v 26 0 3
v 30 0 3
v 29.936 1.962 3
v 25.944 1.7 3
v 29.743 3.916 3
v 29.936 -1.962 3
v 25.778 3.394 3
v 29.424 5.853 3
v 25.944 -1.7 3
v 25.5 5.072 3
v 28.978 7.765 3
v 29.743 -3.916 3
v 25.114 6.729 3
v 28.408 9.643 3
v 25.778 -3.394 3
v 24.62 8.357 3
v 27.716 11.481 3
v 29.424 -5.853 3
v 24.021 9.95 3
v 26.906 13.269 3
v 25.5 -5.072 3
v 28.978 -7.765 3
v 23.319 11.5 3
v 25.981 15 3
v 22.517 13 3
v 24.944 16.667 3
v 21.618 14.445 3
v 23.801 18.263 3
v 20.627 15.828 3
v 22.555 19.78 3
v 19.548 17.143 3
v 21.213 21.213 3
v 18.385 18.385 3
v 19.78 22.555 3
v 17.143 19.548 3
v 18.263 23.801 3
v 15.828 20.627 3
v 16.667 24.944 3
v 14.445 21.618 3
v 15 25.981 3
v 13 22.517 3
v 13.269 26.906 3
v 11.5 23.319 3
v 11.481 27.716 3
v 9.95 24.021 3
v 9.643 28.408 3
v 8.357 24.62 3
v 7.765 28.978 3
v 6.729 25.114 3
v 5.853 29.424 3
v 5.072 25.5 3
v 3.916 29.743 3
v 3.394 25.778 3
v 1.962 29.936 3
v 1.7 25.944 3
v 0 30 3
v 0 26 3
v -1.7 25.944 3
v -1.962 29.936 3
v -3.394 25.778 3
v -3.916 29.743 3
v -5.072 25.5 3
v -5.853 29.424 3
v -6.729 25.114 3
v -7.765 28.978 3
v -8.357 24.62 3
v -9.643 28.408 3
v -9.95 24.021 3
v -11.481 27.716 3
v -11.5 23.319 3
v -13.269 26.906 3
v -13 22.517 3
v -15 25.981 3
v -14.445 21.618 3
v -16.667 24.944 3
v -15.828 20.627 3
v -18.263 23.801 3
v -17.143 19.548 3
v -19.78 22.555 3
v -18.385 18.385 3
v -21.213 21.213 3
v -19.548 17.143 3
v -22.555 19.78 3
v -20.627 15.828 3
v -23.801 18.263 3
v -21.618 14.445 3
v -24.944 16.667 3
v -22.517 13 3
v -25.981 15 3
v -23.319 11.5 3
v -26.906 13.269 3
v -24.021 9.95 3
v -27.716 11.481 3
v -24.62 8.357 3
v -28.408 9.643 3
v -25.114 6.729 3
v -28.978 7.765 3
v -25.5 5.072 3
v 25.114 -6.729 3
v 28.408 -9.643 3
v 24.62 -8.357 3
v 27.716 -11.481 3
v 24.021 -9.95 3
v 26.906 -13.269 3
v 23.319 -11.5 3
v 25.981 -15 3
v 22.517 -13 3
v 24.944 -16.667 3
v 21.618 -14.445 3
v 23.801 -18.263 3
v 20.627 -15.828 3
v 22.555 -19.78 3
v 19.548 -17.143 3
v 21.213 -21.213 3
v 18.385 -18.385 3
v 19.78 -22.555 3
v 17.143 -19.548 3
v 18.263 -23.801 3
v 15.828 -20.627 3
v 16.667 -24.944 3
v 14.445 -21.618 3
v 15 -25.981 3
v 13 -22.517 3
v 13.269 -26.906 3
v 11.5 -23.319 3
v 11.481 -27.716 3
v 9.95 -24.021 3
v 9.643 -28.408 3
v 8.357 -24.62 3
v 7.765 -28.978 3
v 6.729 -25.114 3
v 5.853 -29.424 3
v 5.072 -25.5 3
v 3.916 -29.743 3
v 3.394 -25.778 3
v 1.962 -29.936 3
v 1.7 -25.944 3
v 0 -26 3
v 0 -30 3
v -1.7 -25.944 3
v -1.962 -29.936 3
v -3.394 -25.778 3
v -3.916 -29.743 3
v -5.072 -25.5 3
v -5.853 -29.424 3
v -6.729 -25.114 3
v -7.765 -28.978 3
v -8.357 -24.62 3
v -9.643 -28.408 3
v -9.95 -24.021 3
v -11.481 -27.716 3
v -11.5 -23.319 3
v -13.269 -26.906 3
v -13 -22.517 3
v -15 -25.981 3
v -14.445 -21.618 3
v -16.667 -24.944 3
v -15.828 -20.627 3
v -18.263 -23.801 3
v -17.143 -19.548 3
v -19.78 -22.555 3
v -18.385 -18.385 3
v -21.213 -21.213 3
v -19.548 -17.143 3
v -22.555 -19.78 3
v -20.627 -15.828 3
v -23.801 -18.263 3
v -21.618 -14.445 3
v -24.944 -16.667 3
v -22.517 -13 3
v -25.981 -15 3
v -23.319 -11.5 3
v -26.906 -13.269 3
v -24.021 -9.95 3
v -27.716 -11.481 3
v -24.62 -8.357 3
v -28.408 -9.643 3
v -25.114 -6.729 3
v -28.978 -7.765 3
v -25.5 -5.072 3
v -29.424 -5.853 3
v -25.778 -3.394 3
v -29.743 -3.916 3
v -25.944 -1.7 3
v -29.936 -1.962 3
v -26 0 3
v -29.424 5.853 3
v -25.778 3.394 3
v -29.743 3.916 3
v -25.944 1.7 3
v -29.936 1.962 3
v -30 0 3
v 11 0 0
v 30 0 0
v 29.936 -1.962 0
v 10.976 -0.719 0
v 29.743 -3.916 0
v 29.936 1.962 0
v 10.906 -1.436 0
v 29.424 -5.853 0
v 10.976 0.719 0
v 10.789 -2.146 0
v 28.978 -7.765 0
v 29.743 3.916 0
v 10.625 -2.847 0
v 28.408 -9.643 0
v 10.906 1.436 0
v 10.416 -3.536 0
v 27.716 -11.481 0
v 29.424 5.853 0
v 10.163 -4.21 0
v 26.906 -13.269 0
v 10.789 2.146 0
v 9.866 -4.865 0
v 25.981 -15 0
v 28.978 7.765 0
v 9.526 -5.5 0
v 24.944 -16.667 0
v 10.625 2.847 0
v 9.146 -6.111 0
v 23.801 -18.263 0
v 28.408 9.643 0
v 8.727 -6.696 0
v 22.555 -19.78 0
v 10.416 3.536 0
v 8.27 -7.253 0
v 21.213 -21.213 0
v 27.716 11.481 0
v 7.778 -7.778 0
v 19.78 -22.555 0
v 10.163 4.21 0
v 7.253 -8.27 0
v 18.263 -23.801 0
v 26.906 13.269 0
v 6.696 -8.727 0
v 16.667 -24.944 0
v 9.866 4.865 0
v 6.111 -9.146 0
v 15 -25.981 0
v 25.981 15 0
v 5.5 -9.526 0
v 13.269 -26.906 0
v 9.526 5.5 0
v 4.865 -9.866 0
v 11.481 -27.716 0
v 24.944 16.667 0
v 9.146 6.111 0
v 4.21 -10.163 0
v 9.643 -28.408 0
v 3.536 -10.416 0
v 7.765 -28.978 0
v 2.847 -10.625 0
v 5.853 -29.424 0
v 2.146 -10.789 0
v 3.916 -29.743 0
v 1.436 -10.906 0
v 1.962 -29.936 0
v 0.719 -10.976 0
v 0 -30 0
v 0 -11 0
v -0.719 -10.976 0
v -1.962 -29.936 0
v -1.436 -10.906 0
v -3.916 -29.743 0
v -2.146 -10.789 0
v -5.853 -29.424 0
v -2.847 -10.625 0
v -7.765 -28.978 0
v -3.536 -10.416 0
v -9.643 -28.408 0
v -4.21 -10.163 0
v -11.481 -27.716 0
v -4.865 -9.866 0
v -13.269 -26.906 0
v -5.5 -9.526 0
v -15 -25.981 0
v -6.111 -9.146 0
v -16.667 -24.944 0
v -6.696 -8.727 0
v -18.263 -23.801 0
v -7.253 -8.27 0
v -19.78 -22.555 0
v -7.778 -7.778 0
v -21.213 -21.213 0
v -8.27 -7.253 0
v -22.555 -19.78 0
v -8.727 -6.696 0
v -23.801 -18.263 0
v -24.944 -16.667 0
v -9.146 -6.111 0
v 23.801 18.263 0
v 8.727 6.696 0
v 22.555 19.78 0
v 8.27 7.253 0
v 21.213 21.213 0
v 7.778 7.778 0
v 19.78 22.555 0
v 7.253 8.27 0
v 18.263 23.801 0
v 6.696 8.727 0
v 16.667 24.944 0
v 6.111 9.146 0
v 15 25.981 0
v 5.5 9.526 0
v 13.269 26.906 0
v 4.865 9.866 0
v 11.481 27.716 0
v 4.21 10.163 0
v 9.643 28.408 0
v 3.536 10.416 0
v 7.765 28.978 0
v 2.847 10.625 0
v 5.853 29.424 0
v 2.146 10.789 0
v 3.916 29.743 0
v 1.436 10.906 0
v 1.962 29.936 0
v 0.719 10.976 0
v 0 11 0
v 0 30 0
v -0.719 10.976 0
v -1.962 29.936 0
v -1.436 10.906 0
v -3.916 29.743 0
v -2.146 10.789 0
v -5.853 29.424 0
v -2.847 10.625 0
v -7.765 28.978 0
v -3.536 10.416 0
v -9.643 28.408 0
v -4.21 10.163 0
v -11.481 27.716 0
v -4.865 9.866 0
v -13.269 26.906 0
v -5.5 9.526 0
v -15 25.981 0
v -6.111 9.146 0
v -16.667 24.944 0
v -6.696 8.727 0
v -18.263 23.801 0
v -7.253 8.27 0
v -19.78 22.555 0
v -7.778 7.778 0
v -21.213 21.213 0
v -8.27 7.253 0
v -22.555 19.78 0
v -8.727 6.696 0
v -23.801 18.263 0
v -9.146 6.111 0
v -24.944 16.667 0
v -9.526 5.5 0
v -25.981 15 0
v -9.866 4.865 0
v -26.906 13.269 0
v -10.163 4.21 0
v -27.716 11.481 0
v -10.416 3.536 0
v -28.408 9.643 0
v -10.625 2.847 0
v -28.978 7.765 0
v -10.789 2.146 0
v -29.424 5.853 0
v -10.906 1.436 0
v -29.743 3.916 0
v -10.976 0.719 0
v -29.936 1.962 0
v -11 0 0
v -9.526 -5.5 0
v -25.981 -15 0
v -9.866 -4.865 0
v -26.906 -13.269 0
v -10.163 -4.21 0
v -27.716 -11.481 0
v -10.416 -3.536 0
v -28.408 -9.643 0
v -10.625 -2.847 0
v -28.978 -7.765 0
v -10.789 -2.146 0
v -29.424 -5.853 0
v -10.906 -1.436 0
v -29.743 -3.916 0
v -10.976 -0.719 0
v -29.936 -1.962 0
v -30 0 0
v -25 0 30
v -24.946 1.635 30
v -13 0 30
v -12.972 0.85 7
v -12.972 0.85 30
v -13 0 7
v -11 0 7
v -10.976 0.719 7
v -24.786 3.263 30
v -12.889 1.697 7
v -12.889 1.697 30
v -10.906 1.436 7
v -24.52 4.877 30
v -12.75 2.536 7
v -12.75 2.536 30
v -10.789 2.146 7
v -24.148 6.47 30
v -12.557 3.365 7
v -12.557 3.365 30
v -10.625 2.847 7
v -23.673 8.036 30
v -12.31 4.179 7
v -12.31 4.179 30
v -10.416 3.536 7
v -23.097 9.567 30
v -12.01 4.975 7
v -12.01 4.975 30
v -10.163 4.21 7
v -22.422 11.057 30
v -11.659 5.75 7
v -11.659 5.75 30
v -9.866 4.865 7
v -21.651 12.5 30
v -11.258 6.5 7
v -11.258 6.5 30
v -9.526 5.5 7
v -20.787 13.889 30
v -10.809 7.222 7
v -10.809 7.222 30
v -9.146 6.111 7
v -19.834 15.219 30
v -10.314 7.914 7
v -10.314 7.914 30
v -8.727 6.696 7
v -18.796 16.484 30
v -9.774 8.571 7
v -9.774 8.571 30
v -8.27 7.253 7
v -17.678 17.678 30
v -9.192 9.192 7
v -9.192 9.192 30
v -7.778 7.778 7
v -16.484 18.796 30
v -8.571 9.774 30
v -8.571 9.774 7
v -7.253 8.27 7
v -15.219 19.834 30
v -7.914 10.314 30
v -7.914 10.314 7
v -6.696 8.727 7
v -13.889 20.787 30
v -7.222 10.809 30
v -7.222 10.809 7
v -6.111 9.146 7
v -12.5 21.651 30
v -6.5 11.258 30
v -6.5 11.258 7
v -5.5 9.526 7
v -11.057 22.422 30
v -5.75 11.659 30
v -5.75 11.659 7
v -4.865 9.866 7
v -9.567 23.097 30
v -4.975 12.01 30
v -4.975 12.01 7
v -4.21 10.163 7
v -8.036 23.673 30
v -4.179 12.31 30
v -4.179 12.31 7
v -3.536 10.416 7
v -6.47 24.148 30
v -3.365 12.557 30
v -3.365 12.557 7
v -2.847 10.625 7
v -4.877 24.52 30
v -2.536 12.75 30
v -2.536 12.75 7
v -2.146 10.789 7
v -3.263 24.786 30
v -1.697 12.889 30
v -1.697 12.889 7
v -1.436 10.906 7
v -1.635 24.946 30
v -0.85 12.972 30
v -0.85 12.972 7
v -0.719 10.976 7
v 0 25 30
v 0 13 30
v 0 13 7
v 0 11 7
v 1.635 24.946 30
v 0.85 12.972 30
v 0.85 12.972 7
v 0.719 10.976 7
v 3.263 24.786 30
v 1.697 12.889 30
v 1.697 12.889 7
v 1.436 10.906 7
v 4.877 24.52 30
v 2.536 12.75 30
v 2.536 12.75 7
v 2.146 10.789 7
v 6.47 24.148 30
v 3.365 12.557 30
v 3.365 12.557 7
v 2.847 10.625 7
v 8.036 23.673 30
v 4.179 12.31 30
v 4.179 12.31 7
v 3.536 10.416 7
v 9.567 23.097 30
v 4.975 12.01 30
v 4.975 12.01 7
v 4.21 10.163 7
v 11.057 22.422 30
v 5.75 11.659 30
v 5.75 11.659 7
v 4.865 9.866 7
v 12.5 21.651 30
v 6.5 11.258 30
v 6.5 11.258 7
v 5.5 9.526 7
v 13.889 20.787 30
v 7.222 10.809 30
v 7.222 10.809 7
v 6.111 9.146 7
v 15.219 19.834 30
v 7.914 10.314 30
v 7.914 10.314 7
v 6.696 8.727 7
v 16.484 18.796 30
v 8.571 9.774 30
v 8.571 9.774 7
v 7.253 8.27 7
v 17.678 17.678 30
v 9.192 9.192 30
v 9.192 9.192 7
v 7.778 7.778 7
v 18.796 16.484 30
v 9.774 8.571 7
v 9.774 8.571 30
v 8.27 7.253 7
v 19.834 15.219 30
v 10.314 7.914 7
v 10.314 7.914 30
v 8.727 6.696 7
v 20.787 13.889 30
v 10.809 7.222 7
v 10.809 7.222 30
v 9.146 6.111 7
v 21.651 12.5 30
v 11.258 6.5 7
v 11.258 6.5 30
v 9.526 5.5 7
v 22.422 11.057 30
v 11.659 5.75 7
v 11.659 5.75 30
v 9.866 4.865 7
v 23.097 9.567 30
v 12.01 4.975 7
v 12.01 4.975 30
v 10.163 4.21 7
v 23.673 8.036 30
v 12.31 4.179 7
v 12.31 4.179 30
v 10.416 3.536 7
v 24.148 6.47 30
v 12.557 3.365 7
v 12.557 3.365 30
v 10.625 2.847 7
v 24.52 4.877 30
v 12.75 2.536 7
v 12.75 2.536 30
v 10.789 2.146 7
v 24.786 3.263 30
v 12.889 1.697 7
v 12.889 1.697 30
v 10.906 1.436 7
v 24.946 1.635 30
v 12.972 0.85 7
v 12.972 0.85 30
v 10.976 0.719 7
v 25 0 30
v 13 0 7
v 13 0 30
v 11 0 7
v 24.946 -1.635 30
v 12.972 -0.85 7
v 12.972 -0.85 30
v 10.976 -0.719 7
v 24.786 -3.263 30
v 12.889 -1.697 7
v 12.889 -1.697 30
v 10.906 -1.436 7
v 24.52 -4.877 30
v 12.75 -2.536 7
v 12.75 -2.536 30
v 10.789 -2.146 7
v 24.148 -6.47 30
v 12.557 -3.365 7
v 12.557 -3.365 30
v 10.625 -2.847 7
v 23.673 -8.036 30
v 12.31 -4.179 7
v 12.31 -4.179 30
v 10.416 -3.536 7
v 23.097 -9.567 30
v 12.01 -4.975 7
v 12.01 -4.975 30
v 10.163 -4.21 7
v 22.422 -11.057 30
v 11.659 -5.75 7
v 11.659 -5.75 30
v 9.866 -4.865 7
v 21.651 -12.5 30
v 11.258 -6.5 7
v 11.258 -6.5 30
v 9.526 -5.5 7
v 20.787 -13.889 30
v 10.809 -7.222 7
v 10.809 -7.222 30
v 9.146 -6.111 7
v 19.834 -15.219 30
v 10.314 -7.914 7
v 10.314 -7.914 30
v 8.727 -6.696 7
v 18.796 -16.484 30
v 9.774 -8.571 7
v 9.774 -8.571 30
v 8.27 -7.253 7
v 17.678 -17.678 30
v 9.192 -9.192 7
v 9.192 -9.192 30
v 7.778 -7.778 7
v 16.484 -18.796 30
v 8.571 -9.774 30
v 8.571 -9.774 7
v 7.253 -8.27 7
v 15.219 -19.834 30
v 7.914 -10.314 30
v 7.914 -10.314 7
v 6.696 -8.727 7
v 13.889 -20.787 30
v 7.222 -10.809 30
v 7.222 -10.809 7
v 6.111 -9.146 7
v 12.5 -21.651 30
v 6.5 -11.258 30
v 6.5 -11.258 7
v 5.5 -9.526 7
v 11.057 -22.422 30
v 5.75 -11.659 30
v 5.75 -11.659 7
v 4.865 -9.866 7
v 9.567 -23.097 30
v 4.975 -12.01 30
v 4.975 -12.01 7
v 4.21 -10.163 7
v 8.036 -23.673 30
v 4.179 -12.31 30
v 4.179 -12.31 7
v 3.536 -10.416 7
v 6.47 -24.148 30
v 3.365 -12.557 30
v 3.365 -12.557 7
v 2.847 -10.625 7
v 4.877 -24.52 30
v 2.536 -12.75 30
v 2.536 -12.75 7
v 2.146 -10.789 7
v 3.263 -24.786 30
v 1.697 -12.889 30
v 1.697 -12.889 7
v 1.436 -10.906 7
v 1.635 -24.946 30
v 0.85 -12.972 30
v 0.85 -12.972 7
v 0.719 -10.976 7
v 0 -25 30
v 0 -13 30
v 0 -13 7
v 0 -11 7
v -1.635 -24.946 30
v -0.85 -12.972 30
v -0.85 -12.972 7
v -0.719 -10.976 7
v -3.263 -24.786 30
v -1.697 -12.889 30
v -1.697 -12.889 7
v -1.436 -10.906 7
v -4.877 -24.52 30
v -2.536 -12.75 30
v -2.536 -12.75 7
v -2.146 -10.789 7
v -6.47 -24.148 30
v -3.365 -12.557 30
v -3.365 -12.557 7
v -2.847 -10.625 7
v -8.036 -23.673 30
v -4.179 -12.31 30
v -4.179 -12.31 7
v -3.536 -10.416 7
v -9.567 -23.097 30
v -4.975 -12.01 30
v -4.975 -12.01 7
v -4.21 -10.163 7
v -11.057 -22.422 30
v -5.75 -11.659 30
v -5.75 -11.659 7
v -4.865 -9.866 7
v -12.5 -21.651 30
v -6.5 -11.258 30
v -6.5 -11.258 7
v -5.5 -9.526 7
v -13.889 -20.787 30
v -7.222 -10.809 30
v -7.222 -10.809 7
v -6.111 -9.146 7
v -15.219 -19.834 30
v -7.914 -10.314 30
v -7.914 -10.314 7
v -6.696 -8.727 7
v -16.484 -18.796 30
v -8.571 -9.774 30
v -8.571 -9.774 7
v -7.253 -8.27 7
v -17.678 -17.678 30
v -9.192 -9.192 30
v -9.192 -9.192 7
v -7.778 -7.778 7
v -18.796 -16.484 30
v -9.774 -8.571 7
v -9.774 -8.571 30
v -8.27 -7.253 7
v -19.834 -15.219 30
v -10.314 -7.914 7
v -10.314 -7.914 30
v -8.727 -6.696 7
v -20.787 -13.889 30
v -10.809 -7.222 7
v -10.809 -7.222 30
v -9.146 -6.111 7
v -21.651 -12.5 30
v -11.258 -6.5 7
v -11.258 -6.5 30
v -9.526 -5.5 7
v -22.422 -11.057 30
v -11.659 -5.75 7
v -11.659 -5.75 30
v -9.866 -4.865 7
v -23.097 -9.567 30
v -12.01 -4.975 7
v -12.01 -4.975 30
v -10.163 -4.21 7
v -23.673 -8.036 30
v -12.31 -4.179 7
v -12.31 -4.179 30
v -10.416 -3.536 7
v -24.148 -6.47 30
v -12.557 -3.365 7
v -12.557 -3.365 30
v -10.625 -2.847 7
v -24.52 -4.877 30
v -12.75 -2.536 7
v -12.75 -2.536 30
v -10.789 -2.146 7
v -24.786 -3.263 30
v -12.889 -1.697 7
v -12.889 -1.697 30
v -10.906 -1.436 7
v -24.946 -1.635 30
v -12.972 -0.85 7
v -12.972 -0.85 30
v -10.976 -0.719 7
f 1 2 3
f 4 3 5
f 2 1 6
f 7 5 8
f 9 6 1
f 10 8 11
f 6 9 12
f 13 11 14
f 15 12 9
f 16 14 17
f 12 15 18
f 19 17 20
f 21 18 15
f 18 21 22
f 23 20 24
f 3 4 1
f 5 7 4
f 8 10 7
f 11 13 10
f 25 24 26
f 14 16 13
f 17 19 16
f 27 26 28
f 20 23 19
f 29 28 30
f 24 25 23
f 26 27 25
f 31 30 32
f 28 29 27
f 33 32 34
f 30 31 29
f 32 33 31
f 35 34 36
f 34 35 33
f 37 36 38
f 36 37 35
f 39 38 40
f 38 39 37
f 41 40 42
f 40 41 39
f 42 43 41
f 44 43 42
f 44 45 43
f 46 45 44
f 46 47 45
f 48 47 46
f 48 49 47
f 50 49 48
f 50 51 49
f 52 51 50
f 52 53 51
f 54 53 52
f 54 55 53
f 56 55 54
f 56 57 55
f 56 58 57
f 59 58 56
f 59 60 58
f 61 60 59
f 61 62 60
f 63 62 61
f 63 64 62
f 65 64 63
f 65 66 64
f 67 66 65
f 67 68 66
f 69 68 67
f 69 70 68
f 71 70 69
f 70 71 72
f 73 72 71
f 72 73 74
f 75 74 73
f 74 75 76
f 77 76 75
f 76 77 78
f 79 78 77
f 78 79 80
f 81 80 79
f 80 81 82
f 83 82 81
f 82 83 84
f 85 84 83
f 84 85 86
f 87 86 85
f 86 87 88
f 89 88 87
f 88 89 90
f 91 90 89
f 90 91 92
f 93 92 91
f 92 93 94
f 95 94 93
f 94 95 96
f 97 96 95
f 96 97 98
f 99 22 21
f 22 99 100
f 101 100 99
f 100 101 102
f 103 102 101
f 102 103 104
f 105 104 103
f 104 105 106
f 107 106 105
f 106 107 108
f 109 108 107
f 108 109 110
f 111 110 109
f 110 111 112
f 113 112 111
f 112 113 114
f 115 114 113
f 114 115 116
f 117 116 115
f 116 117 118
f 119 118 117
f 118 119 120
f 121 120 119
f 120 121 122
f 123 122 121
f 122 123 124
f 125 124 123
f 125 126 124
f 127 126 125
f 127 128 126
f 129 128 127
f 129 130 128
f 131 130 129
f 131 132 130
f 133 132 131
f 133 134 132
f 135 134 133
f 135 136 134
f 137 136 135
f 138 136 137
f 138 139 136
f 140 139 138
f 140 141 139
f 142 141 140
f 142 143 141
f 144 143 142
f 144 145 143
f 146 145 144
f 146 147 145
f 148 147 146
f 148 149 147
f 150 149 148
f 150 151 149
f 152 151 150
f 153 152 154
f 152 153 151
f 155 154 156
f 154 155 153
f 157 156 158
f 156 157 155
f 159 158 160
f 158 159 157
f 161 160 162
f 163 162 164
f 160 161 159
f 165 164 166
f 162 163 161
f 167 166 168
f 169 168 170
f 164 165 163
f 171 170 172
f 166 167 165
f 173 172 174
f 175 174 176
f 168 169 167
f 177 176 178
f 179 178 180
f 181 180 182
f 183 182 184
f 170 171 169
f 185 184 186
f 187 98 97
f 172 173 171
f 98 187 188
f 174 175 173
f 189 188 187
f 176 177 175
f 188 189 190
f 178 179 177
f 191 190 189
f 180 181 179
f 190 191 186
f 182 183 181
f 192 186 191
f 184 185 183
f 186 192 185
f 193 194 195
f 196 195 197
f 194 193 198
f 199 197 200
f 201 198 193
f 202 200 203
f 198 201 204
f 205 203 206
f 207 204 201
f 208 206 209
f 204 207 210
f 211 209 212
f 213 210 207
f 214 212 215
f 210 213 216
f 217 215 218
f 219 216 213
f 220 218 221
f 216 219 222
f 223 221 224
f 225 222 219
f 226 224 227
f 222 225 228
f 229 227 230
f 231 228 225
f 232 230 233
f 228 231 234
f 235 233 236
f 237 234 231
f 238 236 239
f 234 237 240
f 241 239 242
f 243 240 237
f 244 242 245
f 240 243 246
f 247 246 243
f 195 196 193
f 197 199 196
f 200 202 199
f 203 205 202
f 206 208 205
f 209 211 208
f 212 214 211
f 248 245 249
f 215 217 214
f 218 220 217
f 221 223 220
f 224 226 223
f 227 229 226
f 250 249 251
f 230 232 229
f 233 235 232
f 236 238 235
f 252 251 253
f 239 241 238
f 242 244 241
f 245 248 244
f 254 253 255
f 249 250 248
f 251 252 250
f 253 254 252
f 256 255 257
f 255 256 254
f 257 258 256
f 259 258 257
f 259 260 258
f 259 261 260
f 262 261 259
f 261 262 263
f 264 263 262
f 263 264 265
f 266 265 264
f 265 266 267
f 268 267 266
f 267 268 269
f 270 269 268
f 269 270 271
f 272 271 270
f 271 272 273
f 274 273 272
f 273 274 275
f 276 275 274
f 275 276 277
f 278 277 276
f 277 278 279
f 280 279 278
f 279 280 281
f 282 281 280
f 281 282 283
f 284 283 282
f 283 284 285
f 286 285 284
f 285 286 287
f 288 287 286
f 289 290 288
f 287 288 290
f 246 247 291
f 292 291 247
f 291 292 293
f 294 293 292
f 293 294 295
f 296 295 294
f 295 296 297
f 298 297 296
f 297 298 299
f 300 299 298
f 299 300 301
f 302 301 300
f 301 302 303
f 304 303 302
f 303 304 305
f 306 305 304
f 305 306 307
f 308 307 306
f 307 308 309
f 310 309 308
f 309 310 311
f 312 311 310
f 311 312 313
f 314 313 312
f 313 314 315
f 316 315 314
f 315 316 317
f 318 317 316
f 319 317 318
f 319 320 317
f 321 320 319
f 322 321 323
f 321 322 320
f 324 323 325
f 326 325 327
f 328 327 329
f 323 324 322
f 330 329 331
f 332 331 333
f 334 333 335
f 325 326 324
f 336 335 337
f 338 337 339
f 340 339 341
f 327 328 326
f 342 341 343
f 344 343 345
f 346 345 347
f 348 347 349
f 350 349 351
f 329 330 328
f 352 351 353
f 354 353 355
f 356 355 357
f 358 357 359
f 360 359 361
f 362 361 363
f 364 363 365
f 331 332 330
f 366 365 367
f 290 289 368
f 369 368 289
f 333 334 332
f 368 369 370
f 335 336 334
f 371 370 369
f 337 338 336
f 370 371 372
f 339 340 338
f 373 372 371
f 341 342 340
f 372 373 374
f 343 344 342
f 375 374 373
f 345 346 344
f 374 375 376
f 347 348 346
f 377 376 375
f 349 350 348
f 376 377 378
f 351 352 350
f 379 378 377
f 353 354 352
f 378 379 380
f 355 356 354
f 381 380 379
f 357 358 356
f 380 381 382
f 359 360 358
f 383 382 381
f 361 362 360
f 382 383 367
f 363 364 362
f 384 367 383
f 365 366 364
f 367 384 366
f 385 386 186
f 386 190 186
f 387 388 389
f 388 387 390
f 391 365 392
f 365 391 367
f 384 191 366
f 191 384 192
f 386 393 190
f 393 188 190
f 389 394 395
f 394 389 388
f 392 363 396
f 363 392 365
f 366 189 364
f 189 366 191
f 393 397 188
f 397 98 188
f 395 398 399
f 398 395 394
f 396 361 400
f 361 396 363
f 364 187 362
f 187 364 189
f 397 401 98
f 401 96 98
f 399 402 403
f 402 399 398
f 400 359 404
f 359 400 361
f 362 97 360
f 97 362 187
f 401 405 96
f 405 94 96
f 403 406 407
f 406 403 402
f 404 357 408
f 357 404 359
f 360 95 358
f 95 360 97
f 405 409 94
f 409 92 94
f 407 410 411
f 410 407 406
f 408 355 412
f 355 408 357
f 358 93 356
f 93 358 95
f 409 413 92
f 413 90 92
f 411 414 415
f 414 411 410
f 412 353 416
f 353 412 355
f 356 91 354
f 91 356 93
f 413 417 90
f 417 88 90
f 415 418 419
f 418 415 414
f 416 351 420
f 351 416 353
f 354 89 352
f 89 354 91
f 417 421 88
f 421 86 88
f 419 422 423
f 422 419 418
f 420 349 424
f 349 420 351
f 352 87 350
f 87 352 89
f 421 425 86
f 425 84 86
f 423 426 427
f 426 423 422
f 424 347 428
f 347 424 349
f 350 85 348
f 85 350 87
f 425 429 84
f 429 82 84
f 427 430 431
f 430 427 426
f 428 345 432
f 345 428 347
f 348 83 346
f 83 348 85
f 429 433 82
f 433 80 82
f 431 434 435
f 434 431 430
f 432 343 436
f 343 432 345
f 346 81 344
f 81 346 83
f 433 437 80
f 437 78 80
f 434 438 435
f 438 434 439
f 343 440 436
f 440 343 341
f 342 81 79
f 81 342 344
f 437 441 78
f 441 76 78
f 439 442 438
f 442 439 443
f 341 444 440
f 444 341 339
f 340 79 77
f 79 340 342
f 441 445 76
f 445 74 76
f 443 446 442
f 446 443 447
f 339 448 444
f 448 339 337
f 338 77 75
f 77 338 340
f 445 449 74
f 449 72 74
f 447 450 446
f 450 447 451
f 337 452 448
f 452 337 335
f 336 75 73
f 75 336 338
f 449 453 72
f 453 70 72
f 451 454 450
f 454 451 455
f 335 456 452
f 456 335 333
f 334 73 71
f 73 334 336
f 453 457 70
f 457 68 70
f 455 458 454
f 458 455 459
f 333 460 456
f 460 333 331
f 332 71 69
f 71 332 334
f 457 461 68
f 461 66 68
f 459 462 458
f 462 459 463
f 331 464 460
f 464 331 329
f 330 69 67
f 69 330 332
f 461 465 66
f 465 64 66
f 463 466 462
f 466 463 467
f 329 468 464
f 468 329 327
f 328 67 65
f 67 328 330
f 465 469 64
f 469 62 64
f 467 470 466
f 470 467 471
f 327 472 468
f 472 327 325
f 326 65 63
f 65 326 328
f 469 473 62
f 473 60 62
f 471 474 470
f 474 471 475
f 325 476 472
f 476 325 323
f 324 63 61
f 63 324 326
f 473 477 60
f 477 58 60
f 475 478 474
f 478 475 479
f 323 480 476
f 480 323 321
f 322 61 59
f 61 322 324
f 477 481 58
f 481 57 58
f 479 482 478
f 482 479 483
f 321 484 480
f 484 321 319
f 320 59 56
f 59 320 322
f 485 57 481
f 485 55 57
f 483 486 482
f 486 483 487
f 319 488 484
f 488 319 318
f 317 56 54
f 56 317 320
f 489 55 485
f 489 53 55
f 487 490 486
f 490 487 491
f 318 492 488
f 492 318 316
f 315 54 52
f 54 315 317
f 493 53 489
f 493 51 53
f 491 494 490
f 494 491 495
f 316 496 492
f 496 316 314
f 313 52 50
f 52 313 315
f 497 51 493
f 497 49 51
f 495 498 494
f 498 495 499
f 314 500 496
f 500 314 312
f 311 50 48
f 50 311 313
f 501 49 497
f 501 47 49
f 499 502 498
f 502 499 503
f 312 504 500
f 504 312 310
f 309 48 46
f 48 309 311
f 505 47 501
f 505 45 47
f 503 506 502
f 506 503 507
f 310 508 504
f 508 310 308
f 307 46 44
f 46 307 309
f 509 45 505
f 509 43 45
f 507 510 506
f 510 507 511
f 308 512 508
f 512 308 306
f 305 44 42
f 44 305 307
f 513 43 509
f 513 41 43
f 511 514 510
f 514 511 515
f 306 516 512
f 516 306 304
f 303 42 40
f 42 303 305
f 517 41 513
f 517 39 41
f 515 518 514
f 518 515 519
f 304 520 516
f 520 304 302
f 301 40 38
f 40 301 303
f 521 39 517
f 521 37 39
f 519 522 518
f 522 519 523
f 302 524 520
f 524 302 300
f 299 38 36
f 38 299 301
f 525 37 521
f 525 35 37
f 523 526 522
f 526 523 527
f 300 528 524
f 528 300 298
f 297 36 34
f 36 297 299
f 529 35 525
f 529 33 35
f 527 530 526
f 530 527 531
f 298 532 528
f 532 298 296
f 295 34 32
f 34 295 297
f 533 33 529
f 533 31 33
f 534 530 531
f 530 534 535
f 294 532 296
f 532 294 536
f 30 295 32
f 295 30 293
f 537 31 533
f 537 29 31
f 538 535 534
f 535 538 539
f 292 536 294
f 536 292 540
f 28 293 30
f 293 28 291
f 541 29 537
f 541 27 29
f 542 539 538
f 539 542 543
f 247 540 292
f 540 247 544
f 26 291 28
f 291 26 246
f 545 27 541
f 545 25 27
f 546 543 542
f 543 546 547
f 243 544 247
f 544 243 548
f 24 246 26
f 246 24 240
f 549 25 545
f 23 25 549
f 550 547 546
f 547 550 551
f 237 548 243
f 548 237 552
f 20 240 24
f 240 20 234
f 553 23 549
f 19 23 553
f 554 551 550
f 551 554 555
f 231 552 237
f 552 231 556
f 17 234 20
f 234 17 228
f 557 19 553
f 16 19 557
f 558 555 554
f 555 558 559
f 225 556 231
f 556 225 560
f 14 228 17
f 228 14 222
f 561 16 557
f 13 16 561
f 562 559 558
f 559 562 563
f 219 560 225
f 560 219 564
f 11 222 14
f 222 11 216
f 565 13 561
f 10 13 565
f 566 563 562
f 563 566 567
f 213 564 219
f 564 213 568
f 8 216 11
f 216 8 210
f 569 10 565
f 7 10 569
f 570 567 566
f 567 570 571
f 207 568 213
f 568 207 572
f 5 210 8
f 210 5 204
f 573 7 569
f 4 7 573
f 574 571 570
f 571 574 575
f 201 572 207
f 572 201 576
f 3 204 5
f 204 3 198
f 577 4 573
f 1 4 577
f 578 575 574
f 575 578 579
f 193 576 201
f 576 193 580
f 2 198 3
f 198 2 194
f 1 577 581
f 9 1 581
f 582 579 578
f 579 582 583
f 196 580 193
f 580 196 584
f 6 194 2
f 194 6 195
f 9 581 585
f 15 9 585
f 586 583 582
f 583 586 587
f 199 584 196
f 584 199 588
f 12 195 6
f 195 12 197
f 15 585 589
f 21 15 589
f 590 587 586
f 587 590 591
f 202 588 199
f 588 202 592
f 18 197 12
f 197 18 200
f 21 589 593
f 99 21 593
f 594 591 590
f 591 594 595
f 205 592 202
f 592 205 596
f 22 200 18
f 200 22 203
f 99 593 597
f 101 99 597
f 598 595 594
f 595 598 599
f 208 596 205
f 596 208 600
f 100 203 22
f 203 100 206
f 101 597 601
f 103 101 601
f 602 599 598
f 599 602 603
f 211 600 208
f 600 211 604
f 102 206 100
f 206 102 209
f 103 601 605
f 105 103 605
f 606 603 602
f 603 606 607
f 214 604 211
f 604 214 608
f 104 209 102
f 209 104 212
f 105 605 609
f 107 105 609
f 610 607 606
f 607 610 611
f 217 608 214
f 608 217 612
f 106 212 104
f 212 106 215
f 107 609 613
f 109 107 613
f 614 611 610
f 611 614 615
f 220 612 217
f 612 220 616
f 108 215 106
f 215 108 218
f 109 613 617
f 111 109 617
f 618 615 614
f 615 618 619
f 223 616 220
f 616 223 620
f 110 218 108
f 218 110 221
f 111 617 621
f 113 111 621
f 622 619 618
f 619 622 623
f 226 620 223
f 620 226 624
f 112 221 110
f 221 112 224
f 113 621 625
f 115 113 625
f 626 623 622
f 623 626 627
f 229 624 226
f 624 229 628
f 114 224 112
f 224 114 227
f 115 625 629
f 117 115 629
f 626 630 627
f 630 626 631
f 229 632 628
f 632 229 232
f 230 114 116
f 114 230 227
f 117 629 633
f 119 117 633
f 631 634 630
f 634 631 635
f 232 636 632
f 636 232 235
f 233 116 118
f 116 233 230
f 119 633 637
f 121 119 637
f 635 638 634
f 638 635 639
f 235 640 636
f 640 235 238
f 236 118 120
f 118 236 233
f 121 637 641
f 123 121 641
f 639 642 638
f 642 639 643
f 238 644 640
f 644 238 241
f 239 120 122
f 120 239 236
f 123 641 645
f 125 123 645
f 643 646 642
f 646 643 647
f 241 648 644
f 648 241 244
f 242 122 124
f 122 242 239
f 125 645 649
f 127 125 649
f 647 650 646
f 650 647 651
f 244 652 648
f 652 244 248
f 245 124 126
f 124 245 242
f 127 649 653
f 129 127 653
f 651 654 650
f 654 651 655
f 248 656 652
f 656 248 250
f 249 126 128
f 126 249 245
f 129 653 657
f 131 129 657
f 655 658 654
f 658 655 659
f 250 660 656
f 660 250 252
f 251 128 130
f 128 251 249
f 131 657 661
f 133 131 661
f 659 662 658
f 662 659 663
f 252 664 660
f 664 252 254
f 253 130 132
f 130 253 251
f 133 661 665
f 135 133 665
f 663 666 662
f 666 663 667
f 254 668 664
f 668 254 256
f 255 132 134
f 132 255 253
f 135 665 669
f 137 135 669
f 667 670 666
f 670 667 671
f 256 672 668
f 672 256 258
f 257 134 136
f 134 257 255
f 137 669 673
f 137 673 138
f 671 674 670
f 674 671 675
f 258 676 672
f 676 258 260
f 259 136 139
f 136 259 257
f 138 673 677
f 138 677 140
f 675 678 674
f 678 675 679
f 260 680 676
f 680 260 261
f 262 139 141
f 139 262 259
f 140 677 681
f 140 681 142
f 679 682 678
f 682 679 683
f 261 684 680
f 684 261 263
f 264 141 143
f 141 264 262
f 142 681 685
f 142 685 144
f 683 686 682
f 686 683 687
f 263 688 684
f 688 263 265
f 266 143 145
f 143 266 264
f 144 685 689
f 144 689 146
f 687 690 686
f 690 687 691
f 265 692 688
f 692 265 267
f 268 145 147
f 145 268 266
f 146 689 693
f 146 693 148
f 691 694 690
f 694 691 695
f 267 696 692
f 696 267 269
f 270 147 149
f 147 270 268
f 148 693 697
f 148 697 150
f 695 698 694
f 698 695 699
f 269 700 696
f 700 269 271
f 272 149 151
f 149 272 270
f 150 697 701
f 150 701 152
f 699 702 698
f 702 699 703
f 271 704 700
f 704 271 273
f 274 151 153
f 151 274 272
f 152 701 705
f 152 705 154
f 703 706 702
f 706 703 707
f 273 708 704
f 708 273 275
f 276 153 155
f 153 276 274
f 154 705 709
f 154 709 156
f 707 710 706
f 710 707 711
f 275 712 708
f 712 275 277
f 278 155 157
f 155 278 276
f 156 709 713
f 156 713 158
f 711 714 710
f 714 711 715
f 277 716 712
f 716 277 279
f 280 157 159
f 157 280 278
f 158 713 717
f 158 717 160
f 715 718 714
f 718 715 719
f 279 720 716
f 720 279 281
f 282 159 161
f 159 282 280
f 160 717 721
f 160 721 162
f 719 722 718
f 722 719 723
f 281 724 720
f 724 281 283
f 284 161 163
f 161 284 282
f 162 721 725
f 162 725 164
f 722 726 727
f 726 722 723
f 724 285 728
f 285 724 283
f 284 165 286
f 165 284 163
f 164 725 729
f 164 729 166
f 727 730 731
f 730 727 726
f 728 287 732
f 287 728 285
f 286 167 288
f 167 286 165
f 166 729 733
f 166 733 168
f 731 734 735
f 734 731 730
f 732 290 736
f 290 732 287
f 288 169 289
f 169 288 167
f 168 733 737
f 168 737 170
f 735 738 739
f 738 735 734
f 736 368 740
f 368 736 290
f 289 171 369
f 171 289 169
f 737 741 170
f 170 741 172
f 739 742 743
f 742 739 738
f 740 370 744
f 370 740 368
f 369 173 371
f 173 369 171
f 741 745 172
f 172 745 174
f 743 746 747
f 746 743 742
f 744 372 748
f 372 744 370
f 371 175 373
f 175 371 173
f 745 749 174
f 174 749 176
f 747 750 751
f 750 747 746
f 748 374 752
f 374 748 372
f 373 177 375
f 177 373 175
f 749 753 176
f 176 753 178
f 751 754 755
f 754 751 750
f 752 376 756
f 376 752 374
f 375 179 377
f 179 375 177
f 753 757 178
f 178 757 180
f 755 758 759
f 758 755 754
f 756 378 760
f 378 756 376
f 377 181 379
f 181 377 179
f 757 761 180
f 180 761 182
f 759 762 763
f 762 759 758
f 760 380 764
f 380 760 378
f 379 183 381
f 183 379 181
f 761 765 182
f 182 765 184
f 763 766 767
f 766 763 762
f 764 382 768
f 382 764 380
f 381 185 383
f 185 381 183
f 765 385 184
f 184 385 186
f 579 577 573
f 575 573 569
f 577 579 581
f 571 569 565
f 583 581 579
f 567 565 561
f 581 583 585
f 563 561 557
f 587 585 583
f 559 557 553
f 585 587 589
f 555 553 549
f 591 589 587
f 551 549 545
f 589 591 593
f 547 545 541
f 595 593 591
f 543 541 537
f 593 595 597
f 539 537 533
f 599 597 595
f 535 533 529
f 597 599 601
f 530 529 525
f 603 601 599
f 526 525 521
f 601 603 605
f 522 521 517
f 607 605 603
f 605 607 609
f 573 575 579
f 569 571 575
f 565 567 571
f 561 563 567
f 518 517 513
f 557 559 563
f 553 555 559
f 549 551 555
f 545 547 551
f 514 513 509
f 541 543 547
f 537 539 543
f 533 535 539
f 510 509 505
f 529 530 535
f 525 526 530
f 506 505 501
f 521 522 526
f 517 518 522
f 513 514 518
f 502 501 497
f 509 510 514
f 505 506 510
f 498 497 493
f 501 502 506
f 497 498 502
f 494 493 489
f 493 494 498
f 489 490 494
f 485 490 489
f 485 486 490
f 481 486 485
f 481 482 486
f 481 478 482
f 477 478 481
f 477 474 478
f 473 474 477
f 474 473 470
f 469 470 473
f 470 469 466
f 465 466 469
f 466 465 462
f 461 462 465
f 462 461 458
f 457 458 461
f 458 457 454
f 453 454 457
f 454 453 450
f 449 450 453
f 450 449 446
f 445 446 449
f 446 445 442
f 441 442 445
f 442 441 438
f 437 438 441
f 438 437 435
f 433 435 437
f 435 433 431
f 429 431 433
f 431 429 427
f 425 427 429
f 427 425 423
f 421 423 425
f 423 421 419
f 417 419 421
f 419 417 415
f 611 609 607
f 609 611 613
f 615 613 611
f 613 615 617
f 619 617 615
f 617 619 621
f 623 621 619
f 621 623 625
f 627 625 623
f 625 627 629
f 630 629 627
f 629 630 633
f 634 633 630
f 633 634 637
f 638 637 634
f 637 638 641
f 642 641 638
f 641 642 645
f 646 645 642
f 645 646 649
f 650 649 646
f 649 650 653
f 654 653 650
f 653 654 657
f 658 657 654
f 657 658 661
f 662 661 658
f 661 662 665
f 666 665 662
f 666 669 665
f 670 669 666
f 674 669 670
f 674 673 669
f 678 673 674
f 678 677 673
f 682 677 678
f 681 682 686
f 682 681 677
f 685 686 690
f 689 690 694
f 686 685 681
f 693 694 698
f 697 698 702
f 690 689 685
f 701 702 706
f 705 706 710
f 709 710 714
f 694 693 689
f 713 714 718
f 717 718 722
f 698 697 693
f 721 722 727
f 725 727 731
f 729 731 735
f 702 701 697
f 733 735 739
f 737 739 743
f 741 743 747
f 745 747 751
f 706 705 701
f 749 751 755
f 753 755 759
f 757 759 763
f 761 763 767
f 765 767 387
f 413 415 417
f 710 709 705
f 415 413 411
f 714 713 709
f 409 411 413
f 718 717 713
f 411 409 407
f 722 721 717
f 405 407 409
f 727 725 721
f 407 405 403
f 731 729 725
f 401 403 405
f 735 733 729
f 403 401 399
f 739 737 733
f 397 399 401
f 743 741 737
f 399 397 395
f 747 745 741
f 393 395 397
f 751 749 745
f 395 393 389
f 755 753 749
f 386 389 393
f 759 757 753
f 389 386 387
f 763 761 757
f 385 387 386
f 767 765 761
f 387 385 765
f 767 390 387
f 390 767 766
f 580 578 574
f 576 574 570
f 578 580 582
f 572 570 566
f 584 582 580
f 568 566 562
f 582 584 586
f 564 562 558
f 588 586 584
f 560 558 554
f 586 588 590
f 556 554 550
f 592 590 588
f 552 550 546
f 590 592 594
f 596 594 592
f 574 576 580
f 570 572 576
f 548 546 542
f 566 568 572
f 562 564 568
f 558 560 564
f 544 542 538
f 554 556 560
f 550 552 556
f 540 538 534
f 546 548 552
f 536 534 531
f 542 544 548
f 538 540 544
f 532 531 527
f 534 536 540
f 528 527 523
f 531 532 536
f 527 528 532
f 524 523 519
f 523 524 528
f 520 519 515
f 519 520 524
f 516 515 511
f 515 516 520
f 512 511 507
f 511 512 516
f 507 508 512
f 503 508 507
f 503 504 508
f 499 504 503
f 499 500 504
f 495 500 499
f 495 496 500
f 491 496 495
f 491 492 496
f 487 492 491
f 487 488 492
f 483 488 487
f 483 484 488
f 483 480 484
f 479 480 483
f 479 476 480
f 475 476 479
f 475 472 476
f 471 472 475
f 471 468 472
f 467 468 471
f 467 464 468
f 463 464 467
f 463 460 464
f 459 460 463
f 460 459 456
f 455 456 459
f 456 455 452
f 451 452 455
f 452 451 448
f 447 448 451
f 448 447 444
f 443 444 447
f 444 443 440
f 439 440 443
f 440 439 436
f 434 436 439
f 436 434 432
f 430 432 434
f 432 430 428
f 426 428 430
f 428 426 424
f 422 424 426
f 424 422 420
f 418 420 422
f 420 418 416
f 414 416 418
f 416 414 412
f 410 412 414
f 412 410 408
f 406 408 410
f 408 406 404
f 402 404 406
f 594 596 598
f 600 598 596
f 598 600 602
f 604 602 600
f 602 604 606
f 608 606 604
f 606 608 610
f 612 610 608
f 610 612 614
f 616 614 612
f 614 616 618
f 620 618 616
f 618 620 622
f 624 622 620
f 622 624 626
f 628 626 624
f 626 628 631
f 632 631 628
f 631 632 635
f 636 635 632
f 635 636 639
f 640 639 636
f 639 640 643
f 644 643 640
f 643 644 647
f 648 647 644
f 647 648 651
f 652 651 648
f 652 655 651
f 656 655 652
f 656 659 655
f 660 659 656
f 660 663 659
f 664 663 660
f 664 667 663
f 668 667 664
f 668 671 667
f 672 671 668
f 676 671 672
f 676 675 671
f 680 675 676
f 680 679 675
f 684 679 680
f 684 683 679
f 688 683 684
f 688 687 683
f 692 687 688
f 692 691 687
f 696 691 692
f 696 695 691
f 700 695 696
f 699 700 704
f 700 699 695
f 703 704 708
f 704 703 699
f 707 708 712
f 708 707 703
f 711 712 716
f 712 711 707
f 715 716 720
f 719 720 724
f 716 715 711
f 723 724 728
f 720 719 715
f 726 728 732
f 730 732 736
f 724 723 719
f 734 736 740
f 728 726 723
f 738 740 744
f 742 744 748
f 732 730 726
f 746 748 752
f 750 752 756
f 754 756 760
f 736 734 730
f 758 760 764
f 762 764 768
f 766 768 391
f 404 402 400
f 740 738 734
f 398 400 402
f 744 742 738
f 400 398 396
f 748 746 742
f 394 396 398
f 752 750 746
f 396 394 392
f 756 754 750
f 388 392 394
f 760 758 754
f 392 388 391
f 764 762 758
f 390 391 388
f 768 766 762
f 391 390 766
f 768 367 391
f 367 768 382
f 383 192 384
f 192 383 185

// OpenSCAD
// Filament spool holder: a stepped hub on a bearing bore, spokes and a rim
spool_hole = 52;      // [30:0.5:80]
bearing_od = 22;      // [10:0.1:40]
bearing_w = 7;        // [3:0.5:15]
hub_len = 30;         // [15:60]
spokes = 5;           // [3:8]
lip = 4;              // [2:10]

$fn = 96;

module spoke(len, w, t) {
  translate([0, -w / 2, 0]) cube([len, w, t]);
}

rotate_extrude()
  polygon([
    [bearing_od / 2, 0],
    [spool_hole / 2 + lip, 0],
    [spool_hole / 2 + lip, 3],
    [spool_hole / 2, 3],
    [spool_hole / 2 - 1, hub_len],
    [bearing_od / 2 + 2, hub_len],
    [bearing_od / 2 + 2, bearing_w],
    [bearing_od / 2, bearing_w]
  ]);

for (i = [0 : spokes - 1])
  rotate([0, 0, i * 360 / spokes])
    translate([bearing_od / 2 + 1, 0, 0]) spoke(spool_hole / 2 - bearing_od / 2, 4, 3);
